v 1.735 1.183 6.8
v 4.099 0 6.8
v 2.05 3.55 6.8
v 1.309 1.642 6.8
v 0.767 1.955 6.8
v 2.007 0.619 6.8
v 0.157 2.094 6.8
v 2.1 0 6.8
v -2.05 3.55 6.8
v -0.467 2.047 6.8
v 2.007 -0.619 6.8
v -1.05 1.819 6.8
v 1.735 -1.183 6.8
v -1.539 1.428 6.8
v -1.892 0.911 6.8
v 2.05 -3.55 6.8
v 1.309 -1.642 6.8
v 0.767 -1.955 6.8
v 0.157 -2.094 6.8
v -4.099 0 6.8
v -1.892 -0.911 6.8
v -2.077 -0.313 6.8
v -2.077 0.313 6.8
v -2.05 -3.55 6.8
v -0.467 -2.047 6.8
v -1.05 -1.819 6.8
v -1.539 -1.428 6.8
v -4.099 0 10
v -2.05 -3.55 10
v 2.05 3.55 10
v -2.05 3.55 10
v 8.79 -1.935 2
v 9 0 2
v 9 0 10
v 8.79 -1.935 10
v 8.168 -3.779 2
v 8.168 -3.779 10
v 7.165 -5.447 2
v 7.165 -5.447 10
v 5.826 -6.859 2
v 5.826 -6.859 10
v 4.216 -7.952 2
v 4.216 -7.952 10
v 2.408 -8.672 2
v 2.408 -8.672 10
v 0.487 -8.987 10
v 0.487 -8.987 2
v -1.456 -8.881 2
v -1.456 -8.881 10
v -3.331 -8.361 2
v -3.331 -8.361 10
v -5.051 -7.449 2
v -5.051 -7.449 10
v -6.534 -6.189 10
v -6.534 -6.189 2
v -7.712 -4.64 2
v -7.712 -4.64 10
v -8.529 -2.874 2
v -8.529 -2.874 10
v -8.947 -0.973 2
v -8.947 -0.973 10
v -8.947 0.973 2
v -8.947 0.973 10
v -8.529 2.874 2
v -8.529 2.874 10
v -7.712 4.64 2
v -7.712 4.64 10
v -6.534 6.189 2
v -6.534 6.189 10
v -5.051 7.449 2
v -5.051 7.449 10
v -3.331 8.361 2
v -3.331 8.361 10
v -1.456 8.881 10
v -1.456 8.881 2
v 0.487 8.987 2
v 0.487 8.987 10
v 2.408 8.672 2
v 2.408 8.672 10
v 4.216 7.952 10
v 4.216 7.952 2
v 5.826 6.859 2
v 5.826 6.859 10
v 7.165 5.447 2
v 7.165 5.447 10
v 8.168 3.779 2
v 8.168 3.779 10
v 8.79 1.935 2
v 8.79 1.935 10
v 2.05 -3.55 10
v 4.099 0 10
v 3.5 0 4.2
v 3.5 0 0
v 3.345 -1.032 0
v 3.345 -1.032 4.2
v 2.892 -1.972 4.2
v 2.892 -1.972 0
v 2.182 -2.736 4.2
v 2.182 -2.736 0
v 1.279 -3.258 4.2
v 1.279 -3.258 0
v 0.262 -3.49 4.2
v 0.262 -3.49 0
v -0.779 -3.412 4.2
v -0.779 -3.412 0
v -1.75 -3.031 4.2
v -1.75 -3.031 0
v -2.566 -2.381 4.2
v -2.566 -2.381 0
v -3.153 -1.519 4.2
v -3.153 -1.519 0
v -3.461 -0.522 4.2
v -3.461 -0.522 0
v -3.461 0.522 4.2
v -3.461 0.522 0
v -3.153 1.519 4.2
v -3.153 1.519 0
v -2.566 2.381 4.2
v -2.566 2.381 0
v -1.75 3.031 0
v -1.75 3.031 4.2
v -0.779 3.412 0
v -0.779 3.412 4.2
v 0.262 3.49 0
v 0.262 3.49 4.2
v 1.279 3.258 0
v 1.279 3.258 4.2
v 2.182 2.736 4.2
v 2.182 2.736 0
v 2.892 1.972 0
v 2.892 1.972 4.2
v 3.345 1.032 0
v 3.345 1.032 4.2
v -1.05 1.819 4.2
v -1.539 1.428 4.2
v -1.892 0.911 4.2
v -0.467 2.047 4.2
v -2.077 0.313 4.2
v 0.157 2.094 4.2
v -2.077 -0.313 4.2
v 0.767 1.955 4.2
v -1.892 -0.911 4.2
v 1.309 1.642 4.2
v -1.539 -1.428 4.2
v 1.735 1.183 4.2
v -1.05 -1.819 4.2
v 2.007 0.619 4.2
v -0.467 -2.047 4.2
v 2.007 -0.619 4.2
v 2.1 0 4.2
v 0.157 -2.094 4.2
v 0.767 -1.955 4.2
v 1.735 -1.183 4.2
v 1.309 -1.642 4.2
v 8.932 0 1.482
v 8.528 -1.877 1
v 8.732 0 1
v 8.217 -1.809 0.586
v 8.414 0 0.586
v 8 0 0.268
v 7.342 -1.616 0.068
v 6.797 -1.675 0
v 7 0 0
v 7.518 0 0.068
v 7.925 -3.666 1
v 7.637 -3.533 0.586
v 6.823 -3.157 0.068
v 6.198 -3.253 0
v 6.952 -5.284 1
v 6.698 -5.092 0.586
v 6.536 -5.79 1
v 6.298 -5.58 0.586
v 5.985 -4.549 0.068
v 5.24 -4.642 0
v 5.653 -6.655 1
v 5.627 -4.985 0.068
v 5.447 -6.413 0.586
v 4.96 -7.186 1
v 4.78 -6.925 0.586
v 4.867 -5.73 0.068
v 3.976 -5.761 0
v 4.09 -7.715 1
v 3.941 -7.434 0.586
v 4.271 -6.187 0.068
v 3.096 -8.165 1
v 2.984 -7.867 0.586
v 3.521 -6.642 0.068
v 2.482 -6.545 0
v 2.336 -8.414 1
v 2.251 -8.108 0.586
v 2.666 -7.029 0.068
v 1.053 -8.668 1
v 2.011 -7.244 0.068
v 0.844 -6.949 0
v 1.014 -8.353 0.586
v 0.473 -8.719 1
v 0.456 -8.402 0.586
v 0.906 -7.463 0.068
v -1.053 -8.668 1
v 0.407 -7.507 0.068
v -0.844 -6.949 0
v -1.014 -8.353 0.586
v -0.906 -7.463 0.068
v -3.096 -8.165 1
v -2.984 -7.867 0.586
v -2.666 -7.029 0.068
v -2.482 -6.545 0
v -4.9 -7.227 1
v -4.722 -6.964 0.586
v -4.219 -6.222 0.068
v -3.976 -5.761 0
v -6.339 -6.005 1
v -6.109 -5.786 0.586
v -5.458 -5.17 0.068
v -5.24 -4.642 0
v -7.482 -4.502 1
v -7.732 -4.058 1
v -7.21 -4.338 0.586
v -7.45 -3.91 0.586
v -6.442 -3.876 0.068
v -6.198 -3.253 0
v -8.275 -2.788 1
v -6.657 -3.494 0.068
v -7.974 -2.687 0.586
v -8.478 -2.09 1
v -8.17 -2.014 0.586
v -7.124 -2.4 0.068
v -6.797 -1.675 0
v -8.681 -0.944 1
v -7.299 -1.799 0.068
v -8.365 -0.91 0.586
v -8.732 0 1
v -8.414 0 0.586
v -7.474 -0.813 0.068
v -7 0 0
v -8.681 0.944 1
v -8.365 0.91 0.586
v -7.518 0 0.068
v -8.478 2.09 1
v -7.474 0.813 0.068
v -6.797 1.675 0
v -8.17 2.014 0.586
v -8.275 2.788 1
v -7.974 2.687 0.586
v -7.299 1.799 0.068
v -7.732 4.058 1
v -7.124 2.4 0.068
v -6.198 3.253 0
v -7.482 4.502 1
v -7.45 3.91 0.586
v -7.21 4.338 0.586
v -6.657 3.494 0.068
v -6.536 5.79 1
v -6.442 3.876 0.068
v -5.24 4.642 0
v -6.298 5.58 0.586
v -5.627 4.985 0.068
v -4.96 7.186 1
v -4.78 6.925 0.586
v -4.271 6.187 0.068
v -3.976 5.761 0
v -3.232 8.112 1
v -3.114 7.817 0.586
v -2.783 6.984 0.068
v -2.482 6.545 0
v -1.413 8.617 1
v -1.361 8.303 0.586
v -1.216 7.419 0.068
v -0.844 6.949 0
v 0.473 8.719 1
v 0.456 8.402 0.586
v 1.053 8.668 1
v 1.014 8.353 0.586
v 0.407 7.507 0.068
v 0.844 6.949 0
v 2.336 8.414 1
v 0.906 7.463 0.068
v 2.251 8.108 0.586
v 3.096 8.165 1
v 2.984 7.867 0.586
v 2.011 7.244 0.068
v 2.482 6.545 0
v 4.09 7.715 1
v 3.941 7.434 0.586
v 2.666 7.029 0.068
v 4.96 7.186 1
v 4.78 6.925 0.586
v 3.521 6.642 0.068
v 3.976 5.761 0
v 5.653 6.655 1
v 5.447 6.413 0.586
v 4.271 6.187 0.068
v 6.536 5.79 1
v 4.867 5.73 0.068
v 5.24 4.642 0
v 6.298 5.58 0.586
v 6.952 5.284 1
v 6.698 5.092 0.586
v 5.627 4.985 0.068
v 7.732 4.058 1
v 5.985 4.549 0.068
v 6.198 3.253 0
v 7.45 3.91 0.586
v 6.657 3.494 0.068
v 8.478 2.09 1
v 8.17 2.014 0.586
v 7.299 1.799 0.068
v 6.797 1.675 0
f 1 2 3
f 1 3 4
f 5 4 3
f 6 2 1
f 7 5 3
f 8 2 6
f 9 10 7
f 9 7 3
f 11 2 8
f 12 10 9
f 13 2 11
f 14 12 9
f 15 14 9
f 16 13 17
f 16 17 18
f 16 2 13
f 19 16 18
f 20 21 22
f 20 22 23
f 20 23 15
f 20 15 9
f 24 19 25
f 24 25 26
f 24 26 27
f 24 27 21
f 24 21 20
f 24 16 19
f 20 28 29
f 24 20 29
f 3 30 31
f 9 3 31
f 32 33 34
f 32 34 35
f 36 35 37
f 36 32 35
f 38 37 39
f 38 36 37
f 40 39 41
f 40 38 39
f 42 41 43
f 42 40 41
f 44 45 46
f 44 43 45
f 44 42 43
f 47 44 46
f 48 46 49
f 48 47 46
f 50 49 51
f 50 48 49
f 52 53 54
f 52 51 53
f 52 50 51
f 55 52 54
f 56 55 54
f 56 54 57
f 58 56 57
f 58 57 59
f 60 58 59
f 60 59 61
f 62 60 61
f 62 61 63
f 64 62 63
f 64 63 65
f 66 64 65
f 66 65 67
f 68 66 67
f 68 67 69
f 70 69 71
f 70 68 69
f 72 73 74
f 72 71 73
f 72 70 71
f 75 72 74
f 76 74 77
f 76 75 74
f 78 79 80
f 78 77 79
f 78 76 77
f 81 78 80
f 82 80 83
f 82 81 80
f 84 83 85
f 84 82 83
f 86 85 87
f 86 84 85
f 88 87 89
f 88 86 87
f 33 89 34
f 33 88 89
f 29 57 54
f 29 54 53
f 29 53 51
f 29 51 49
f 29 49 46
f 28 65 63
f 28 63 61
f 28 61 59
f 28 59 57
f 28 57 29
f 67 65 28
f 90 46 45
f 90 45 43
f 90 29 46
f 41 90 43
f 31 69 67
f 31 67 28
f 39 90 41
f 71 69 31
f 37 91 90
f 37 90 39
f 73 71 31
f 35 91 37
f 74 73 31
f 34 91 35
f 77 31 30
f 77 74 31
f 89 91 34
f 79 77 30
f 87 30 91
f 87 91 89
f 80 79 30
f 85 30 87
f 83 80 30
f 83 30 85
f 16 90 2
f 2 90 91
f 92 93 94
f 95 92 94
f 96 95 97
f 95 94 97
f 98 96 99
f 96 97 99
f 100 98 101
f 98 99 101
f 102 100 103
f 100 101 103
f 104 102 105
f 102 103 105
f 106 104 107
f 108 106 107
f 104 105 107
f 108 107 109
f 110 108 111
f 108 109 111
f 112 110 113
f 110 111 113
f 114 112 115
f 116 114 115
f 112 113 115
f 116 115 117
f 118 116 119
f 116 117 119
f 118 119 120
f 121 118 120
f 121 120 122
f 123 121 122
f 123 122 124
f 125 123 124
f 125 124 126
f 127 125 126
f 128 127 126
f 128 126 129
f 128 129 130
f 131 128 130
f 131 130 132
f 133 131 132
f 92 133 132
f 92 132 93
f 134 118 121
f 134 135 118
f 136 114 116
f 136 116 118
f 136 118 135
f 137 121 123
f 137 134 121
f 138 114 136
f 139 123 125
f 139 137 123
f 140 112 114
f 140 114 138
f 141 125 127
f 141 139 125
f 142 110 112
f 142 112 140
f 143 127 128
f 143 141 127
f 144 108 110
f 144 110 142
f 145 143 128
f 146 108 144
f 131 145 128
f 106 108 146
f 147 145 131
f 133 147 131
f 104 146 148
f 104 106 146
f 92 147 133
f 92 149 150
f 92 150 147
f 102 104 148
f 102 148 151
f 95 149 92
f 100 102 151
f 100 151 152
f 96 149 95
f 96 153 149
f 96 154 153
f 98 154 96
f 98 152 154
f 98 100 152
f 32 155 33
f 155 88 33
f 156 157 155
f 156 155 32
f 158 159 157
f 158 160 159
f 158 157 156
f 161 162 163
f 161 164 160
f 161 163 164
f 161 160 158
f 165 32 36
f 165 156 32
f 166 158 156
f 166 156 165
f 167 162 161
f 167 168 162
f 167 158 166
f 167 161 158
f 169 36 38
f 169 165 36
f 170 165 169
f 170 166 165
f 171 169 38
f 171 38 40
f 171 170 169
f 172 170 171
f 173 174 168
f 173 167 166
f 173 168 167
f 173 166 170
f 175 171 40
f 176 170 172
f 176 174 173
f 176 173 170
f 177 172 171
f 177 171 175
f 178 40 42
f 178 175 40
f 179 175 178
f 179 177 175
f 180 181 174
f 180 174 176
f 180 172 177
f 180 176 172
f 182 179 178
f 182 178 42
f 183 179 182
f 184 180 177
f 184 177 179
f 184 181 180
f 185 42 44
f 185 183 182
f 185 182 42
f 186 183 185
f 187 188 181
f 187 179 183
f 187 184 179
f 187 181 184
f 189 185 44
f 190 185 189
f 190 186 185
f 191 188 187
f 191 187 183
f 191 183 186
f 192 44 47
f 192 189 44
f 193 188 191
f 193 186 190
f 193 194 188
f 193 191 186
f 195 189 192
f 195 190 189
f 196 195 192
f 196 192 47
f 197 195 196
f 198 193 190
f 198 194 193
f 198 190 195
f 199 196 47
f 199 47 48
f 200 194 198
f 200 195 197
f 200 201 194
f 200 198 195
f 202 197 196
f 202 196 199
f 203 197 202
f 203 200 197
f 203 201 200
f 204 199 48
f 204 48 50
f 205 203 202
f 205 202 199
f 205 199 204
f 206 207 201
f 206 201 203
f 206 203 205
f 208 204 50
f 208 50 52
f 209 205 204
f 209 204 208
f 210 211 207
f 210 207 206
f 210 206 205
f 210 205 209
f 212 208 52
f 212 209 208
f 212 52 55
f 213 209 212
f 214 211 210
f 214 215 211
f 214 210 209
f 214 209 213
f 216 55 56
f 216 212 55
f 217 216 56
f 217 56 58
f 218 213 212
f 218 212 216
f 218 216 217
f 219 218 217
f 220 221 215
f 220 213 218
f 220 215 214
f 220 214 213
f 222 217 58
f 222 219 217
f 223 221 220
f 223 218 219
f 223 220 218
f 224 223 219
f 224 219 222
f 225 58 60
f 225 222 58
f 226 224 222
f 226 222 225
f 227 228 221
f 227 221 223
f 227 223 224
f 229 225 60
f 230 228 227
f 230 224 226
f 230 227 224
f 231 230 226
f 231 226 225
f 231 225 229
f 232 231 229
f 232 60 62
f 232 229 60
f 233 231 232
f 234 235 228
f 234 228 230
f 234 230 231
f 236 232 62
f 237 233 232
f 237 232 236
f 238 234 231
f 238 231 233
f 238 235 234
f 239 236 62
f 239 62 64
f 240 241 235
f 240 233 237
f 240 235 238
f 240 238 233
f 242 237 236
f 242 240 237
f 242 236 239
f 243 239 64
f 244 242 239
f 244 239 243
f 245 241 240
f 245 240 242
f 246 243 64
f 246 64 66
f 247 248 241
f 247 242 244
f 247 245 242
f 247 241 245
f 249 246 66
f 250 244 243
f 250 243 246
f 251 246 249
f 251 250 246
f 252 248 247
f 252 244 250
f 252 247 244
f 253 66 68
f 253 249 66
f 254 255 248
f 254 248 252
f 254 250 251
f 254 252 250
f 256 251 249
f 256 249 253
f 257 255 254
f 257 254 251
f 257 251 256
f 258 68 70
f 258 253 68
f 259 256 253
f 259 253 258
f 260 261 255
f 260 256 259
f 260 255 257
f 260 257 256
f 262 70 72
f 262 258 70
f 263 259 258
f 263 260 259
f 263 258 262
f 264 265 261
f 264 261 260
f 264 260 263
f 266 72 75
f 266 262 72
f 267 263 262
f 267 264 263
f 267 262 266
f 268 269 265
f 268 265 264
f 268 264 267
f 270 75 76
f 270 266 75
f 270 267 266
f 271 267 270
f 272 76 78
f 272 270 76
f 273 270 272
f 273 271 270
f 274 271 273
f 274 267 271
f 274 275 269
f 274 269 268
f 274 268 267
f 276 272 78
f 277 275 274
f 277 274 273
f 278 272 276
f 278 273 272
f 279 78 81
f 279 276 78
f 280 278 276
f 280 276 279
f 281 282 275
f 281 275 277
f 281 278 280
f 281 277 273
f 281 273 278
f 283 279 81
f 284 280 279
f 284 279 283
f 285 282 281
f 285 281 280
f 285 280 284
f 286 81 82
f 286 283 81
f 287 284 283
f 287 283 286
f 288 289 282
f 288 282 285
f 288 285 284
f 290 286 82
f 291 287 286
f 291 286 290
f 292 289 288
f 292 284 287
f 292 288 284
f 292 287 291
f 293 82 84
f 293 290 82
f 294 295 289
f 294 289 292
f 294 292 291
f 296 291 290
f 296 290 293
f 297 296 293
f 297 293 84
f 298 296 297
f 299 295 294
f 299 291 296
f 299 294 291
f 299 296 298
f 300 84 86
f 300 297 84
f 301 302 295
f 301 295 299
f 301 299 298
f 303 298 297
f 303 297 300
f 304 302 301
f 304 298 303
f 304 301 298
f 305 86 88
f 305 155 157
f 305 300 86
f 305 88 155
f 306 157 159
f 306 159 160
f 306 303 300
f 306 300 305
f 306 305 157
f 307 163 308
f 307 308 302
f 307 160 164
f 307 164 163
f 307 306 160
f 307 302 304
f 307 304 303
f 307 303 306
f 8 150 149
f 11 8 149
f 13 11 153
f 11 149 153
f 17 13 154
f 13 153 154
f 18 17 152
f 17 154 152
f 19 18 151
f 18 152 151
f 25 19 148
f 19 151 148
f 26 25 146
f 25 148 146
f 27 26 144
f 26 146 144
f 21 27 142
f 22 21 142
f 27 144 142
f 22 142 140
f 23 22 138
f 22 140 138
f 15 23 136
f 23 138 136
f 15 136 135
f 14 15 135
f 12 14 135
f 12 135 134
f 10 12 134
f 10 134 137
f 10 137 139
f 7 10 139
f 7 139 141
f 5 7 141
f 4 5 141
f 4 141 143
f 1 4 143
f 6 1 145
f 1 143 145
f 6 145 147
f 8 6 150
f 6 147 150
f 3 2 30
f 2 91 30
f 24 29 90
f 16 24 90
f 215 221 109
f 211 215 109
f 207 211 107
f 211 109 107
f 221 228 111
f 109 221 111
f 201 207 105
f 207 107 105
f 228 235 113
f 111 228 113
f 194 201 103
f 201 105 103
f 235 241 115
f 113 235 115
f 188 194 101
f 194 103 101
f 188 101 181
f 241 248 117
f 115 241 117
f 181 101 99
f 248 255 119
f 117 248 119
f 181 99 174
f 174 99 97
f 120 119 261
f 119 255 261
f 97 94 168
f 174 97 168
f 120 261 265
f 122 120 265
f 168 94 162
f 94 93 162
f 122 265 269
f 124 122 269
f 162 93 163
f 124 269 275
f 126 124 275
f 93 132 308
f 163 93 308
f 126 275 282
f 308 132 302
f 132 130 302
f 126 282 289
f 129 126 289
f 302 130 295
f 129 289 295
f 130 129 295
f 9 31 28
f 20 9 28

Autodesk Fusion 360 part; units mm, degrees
ref_plane "WorkPlane1" through (0, 0, 0) normal (0, 0, 1) x (1, 0, 0)
sketch "Sketch1" plane through (0, 0, 0) normal (0, 0, 1) x (1, 0, 0)
  circle A0 centre (0, 0) radius 9
  dimension "d2" = 18
extrude "Extrude1" add sketch "Sketch1" along normal blind 10
sketch "Sketch2" plane through (0, 0, 10) normal (0, 0, 1) x (-1, 0, 0)
  circle A0 centre (0, 0) radius 9
  line L0 (-2.0496, -3.55) -> (2.0496, -3.55)
  line L1 (2.0496, -3.55) -> (4.0992, 0)
  line L2 (4.0992, 0) -> (2.0496, 3.55)
  line L3 (2.0496, 3.55) -> (-2.0496, 3.55)
  line L4 (-2.0496, 3.55) -> (-4.0992, 0)
  line L5 (-4.0992, 0) -> (-2.0496, -3.55)
  dimension "d5" = 3.55
extrude "Extrude2" cut sketch "Sketch2" against normal blind 3.2 contours L0 L1 L2 L3 L4 L5
sketch "Sketch3" plane through (0, 0, 0) normal (0, 0, -1) x (1, 0, 0)
  circle A0 centre (0, 0) radius 9
  circle A1 centre (0, 0) radius 3.5
  dimension "d8" = 7
extrude "Extrude3" cut sketch "Sketch3" against normal blind 4.2 contours A1
sketch "Sketch4" plane through (0, 0, 4.2) normal (0, 0, -1) x (1, 0, 0)
  circle A0 centre (0, 0) radius 3.5
  circle A1 centre (0, 0) radius 2.1
  dimension "d11" = 4.2
extrude "Extrude4" cut sketch "Sketch4" against normal up to surface (2.6 mm away) contours A1
fillet "Fillet1" radius 2 1 edges at (-8.3909, -3.2545, 0)
equation "d5 = ( 7.1 / 2 ) * 1 mm"
